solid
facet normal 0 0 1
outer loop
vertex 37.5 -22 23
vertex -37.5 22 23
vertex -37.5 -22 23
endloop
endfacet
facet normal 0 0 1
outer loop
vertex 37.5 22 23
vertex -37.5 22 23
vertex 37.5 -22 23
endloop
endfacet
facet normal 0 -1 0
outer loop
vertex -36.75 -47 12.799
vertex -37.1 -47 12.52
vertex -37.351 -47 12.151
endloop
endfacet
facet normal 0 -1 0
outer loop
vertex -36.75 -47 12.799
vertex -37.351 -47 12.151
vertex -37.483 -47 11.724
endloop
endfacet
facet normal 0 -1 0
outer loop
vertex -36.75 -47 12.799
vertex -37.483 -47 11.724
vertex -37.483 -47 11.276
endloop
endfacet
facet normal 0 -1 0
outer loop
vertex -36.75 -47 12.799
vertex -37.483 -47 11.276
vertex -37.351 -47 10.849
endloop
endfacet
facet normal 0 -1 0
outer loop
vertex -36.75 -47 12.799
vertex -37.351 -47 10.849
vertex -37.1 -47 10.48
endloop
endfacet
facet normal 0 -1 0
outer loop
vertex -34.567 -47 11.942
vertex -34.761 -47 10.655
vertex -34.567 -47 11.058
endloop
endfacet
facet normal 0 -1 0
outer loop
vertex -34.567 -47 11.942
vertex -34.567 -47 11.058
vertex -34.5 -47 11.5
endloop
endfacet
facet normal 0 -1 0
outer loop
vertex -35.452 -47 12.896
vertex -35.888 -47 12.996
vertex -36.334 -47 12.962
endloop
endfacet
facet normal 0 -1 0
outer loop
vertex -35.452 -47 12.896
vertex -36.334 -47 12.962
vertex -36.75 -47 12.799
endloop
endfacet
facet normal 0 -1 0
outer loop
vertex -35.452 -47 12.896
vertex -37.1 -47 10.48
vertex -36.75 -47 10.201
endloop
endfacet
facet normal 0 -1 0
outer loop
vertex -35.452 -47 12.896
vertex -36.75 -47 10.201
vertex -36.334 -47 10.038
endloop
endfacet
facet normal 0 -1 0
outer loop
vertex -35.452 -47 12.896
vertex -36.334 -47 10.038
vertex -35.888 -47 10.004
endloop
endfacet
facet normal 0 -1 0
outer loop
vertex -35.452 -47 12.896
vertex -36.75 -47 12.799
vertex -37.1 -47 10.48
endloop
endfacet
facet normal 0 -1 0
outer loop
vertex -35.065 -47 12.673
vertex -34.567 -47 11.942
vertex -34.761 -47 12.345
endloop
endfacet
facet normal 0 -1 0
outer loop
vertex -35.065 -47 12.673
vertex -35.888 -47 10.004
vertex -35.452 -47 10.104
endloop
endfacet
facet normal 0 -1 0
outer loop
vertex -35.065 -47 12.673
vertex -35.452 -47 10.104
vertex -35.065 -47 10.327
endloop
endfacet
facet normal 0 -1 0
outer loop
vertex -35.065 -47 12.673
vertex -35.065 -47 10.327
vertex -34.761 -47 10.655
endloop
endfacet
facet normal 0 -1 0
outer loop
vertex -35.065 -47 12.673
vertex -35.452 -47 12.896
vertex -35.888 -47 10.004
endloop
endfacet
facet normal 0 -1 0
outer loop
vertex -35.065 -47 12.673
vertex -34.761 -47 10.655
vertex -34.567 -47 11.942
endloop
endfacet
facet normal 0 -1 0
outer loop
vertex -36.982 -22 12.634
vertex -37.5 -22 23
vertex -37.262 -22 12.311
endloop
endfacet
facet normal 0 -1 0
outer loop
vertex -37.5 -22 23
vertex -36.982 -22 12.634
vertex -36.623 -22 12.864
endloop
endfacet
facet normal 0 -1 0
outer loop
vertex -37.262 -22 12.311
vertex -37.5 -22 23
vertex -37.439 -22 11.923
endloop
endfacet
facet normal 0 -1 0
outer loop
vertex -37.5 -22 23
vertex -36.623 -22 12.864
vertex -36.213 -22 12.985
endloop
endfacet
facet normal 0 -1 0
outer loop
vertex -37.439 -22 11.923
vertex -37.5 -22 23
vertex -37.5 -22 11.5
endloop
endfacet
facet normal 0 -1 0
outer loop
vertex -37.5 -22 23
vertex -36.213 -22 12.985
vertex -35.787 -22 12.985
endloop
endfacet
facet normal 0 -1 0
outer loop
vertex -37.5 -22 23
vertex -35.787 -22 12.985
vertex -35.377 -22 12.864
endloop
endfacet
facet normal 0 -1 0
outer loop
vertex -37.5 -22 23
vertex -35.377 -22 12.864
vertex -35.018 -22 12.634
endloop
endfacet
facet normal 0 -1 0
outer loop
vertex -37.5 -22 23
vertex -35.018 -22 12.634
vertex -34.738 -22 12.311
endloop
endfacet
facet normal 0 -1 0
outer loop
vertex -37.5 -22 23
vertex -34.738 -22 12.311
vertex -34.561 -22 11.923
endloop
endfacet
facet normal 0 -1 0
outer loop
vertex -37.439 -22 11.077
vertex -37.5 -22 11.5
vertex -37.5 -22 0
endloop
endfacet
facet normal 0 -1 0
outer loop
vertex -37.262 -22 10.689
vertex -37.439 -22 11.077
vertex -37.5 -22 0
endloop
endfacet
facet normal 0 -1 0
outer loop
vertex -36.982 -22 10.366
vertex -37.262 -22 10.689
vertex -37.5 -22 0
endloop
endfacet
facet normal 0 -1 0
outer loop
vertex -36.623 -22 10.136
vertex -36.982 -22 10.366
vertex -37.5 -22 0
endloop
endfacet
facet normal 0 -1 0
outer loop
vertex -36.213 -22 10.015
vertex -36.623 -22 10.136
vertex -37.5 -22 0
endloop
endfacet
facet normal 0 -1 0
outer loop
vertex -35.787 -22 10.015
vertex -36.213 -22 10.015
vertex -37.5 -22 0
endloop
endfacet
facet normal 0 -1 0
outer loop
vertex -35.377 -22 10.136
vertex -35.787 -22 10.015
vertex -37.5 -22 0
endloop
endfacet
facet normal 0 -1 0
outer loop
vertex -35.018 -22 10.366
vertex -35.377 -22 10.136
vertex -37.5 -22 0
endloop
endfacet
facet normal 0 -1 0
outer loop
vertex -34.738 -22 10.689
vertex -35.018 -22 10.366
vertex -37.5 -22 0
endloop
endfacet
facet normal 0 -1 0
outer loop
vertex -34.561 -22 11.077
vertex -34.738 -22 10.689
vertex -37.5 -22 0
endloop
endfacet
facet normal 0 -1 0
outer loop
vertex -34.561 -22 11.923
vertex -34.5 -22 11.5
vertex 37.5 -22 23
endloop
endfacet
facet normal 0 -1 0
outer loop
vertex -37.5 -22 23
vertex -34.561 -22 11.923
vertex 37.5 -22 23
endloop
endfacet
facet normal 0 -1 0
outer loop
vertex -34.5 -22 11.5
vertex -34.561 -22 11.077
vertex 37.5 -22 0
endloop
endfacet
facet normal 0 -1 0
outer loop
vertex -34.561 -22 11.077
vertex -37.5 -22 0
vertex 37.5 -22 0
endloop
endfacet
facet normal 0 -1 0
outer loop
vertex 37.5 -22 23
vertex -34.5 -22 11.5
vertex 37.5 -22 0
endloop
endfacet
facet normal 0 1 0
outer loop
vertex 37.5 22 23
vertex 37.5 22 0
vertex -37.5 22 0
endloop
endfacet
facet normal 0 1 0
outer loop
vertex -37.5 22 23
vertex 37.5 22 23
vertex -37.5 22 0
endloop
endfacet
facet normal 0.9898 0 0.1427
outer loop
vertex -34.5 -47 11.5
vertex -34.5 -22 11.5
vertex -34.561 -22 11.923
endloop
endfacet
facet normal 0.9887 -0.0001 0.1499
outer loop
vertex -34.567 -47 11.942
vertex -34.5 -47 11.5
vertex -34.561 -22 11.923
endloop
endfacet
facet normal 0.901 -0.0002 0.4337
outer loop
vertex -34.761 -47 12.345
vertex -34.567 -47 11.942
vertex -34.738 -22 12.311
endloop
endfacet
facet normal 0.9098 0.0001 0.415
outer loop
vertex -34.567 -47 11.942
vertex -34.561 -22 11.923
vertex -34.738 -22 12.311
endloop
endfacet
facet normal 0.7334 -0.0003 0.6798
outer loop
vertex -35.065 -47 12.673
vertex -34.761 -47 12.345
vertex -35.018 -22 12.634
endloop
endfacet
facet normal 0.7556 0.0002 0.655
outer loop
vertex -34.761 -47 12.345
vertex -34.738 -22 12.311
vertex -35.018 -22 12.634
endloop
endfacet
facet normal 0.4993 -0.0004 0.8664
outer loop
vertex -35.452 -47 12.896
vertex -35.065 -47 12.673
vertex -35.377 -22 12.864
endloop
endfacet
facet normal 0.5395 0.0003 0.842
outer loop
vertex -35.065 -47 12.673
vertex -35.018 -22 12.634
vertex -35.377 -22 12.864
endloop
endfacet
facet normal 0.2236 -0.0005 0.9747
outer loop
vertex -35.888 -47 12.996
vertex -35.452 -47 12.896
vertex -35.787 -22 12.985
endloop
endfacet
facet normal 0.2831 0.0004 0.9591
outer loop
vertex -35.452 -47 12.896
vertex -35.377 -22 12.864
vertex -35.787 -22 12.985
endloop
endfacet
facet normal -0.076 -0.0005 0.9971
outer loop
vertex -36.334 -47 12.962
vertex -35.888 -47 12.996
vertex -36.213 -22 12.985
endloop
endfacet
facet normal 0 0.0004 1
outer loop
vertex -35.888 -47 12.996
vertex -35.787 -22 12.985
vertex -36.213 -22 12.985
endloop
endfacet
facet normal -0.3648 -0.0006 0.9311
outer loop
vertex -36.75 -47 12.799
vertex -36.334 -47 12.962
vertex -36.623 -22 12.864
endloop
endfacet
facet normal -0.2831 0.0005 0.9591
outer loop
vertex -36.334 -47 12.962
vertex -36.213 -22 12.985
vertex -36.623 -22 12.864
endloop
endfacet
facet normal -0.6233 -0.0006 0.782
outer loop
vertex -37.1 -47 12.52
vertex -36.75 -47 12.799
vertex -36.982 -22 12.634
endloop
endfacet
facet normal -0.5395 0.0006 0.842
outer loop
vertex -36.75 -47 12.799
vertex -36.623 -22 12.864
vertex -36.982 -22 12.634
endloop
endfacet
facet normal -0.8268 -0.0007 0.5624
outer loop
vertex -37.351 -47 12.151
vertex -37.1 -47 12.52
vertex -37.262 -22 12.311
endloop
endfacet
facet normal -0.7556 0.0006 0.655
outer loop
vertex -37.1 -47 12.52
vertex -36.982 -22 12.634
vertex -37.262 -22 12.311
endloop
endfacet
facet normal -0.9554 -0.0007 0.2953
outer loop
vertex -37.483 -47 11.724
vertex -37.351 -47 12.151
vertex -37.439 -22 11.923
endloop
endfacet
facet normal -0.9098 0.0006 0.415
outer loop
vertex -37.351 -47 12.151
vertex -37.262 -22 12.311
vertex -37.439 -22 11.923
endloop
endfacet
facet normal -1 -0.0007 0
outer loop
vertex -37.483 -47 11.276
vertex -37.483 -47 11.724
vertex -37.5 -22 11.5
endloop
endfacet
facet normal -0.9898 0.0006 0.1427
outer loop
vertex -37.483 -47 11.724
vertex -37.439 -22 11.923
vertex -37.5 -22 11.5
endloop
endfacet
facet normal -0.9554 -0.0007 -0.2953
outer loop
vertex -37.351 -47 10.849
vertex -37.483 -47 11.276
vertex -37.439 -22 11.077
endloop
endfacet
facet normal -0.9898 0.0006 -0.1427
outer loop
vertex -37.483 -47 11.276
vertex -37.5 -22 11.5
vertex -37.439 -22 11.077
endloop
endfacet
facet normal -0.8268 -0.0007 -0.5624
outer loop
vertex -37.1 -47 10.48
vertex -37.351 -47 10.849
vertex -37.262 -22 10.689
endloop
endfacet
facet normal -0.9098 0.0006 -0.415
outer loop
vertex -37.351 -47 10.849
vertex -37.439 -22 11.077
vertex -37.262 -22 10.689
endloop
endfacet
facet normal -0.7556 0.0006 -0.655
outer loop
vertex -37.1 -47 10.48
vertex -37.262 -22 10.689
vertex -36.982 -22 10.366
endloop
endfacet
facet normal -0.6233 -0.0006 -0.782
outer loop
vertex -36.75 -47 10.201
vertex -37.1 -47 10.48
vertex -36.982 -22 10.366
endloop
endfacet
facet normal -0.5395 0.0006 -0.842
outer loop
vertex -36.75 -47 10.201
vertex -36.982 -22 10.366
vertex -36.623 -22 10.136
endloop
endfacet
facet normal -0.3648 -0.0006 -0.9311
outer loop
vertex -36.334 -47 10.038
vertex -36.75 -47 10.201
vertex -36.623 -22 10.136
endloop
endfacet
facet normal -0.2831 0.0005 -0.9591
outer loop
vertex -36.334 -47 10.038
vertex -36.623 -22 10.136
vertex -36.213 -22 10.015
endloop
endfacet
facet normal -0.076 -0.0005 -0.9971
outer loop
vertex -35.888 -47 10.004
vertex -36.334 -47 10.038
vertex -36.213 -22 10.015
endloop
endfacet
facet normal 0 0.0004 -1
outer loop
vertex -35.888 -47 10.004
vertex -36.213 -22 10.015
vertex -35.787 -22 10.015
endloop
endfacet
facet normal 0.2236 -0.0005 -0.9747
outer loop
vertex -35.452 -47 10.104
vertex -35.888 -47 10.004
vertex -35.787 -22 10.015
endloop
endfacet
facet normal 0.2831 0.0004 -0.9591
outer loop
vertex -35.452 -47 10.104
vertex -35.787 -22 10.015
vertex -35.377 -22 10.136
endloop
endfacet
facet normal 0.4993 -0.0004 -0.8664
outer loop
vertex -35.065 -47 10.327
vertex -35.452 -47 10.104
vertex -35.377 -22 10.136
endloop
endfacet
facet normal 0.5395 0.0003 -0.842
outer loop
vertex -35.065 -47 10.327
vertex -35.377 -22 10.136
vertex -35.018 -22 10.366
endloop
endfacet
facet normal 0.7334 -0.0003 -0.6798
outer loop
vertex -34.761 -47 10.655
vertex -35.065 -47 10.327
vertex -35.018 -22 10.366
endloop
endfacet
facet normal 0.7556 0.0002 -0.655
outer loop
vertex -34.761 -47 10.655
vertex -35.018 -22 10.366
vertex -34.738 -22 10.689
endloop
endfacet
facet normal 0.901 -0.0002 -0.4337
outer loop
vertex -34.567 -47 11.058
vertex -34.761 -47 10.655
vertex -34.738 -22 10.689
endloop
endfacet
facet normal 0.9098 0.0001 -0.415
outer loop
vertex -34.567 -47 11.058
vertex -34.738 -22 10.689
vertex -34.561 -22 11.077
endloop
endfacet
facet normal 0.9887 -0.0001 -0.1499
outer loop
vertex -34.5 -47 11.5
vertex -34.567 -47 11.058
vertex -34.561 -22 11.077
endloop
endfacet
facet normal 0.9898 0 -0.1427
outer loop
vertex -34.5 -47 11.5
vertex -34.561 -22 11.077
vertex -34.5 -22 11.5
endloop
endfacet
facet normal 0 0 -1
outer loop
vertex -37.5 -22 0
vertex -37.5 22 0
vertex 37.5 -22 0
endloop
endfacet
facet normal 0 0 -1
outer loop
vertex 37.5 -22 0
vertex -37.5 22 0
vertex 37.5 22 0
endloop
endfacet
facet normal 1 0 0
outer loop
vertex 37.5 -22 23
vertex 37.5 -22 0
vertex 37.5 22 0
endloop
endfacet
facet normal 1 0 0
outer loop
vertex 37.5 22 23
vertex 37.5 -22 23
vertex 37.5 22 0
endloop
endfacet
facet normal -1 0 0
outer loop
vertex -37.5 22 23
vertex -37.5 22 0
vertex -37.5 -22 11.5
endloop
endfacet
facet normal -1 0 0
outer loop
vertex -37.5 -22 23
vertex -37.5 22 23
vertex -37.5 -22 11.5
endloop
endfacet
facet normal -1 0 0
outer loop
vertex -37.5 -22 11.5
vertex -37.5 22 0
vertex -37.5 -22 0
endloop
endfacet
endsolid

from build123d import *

# Parameters (mm, degrees)
F1_DEPTH = 23
F3_DEPTH = 25


# Not quite as in the source:
# - the program builds the solid bodies; features that only make, move or delete a surface that nothing else refers to are left out


with BuildPart() as f1:
    # F0 (on Top) → F1 (new body)
    with BuildSketch(Plane.XY):
        Polygon((-37.5, 22), (-37.5, -22), (-15.1, -22), (37.5, -22), (37.5, 22), (-15.1, 22), align=None)
    extrude(amount=F1_DEPTH)

    # F2 (on face) → F3 (join)
    with BuildSketch(Plane.XZ.offset(22)):
        with BuildLine():
            ThreePointArc((-37.5, 11.5), (-36, 10), (-34.5, 11.5))
            ThreePointArc((-34.5, 11.5), (-36, 13), (-37.5, 11.5))
        make_face()
    extrude(amount=F3_DEPTH)


solid = f1.part
